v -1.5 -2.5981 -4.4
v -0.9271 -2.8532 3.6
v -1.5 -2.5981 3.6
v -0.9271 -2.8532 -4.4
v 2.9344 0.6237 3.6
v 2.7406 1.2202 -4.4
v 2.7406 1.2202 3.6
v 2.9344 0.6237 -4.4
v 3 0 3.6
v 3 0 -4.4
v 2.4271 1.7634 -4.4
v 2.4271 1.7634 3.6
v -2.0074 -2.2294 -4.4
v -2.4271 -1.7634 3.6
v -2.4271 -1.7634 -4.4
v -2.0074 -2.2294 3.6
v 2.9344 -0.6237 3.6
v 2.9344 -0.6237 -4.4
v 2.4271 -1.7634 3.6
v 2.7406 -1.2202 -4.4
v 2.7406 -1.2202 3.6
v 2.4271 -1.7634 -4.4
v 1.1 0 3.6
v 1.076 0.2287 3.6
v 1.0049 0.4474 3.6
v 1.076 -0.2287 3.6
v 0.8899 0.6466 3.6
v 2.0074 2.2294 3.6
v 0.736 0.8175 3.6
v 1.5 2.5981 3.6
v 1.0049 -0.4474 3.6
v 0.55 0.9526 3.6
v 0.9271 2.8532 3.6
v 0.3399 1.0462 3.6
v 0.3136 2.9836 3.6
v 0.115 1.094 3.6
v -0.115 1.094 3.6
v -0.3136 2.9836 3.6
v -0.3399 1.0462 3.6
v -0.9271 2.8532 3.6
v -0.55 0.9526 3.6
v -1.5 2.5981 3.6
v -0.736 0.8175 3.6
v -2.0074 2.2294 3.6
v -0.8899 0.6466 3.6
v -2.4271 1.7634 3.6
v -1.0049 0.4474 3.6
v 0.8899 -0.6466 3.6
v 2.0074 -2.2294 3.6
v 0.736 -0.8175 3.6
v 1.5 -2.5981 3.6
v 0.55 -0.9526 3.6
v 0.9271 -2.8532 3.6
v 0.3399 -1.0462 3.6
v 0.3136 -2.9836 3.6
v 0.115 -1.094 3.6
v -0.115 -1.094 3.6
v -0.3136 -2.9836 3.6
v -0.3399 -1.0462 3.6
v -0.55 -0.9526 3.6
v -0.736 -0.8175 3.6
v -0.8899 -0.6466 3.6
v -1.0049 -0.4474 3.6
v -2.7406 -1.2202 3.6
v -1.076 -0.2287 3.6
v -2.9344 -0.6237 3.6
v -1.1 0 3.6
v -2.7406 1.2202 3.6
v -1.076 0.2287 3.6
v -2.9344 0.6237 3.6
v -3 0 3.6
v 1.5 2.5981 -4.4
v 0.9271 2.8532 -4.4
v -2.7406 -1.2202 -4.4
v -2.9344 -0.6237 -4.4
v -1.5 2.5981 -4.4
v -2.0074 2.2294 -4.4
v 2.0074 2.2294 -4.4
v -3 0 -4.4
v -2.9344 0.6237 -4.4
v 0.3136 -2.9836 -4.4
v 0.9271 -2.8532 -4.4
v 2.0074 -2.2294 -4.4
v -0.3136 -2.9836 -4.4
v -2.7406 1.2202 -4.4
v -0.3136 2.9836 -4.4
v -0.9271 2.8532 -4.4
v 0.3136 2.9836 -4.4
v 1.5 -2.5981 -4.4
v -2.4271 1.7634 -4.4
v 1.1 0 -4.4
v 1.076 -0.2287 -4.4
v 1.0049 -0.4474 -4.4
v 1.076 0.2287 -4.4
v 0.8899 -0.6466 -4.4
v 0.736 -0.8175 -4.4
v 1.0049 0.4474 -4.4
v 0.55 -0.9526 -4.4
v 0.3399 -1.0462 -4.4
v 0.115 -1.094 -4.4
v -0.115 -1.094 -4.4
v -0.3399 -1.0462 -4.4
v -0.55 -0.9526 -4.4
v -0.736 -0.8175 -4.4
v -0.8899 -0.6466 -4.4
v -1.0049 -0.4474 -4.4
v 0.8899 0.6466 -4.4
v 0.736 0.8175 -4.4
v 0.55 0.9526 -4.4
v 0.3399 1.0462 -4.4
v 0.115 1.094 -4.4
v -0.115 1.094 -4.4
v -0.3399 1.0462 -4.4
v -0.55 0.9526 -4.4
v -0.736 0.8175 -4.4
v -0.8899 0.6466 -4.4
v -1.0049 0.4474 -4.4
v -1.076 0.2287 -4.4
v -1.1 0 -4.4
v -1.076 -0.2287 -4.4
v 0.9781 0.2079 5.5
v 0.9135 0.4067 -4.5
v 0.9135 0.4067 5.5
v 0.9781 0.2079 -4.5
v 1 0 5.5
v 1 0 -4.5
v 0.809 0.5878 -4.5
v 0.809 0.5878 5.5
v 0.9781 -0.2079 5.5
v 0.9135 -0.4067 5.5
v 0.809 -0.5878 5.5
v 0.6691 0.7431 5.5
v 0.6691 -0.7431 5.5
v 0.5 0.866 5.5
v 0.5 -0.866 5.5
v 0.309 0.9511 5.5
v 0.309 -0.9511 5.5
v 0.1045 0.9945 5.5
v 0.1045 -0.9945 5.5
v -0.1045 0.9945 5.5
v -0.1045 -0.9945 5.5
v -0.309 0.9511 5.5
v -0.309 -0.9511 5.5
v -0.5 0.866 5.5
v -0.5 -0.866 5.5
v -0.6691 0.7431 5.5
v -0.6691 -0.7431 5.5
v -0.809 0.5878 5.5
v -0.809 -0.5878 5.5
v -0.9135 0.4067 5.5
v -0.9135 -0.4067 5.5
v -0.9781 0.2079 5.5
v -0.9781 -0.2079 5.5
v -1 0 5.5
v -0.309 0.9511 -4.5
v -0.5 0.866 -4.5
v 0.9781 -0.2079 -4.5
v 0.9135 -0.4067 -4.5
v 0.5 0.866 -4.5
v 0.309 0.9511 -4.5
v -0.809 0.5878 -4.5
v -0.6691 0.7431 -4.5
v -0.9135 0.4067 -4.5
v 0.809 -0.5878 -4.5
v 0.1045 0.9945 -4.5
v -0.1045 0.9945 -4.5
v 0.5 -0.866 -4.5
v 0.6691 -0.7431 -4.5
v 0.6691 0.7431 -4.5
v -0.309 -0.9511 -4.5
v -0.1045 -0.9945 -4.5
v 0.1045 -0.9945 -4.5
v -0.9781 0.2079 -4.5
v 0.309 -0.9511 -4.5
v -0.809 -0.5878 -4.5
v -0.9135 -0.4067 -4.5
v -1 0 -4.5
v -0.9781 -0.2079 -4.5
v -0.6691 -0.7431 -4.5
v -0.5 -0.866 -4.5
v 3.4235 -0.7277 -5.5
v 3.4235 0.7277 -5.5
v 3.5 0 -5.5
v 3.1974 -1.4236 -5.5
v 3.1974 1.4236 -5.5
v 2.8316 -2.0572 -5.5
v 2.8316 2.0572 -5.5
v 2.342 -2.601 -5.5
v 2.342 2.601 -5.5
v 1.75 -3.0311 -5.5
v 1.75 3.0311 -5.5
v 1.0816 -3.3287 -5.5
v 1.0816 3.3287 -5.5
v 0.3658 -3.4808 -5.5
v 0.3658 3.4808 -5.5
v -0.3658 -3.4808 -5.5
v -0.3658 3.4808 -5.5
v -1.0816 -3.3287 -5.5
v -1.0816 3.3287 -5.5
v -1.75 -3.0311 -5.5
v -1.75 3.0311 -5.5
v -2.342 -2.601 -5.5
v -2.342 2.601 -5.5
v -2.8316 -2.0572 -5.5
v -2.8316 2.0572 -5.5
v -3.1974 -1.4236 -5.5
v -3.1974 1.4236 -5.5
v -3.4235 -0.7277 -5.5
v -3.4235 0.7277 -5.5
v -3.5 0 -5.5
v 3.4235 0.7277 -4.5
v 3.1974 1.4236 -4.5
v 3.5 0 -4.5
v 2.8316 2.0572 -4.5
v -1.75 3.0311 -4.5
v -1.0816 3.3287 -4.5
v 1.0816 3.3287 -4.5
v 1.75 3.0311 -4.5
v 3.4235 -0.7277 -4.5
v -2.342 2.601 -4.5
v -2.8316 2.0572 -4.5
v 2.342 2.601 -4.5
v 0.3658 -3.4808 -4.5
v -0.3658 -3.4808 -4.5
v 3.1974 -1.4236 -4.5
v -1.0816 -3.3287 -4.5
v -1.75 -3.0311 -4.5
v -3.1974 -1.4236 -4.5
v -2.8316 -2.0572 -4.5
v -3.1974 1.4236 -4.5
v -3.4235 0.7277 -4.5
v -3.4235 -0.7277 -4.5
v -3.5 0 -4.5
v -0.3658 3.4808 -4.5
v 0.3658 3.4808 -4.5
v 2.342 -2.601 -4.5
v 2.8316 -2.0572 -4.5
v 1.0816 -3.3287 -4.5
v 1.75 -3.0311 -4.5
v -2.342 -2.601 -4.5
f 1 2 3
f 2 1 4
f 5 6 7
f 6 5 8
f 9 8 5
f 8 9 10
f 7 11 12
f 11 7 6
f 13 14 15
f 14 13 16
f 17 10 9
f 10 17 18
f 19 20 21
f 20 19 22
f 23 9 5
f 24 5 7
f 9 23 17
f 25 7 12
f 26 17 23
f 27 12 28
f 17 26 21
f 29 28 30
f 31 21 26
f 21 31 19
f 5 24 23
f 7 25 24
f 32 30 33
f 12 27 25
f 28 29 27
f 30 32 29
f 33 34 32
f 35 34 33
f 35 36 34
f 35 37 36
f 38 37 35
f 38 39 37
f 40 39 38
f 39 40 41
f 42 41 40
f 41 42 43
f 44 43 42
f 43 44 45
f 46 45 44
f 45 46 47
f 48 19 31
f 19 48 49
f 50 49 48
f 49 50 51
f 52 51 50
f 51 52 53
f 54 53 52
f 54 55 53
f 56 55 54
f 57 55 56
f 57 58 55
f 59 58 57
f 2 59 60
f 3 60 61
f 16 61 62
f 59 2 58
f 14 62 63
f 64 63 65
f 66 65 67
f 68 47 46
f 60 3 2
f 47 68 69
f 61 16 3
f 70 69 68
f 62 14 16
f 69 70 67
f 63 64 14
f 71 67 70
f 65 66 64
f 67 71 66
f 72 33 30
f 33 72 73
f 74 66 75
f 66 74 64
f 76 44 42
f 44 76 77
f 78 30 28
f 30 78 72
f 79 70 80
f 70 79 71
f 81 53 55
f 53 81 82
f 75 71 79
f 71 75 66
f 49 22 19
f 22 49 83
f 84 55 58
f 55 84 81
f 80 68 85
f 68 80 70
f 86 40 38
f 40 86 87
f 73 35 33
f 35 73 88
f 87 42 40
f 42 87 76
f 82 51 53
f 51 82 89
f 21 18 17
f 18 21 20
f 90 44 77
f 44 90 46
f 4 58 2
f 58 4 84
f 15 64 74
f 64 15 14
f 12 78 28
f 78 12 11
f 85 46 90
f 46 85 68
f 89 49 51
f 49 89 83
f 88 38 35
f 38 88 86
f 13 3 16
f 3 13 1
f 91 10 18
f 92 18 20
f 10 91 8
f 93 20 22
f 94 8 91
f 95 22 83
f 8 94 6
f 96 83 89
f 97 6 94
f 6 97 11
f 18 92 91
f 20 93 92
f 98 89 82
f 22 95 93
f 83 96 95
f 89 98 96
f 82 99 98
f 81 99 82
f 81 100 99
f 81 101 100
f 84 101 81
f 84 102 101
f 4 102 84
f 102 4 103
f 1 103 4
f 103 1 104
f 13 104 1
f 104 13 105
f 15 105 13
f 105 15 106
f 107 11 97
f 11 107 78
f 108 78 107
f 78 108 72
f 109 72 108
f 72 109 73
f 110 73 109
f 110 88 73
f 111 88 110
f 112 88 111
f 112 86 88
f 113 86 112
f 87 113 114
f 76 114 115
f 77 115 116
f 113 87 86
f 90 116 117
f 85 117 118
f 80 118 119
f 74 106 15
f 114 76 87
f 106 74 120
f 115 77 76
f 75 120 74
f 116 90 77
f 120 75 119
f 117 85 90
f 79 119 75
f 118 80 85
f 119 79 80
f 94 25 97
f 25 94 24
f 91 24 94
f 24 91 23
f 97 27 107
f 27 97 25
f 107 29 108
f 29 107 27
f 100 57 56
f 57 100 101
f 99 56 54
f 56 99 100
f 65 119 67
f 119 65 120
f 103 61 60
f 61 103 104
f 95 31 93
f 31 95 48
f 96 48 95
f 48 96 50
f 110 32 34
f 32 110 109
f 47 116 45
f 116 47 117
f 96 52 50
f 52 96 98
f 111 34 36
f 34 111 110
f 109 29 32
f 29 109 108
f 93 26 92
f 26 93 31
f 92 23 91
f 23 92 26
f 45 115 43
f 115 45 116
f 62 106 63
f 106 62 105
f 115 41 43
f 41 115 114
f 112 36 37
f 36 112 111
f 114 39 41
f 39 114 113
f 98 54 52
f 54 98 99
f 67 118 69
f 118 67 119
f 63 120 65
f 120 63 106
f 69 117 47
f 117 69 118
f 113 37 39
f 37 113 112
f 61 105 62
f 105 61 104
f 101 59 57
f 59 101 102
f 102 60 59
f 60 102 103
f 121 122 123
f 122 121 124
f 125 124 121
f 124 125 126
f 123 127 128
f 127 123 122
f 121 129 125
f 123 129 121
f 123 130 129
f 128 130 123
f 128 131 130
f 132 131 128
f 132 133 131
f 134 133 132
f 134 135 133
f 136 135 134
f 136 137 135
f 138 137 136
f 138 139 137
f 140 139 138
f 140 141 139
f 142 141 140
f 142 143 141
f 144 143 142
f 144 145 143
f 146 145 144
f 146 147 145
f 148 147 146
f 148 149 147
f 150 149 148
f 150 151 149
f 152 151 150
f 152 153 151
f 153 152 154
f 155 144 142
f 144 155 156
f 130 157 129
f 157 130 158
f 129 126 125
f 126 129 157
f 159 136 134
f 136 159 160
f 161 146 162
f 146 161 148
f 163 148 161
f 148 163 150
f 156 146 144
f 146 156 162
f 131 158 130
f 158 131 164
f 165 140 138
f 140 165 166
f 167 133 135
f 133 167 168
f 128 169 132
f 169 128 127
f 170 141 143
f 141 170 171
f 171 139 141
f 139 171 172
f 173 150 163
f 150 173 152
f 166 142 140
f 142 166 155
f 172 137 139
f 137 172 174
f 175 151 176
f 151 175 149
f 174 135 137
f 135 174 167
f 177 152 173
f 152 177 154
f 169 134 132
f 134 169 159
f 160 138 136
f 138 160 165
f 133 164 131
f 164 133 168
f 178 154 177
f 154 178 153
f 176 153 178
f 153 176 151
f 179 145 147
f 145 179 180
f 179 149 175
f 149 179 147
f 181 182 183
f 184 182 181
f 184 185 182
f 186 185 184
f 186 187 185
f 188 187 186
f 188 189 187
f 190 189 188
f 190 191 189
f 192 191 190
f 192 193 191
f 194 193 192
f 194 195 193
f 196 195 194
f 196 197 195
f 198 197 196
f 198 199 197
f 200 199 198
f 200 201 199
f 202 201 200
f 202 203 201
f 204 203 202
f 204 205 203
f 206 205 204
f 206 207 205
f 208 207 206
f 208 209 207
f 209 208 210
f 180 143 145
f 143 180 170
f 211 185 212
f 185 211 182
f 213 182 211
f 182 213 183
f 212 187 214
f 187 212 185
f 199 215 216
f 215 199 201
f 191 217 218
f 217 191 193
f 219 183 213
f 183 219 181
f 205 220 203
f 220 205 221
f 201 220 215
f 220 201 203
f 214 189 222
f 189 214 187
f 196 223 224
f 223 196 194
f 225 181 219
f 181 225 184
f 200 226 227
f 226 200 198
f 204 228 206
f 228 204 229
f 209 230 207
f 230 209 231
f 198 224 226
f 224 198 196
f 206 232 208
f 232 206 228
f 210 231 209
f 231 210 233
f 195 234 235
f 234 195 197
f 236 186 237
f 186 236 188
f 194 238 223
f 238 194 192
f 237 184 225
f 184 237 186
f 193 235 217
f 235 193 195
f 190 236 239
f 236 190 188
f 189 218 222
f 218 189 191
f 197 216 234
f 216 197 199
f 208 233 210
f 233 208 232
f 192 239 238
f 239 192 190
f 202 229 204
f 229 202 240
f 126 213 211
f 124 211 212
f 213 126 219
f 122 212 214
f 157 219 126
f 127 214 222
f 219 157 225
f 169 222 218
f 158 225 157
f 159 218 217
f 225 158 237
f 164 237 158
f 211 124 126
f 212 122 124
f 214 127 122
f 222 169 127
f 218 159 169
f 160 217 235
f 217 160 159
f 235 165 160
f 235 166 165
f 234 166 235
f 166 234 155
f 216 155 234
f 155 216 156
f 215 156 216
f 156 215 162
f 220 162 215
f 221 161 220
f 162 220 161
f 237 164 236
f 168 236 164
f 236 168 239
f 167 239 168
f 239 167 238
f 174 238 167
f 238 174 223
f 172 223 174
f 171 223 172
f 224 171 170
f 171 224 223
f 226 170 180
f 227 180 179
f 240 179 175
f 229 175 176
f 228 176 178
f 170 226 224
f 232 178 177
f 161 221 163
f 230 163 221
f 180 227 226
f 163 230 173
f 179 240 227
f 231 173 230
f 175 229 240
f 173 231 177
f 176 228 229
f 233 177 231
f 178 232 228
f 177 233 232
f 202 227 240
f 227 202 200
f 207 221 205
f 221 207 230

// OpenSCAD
color("#A1662F")
cylinder(11,1,1, $fn = 30, center = true);

color("#A1662F")
translate([0,0,-5]){
cylinder(1,3.5,3.5, $fn = 30, center = true);
}



translate([0,0,-0.4]){
difference(){
color("#edefe2")
cylinder(8,3,3, $fn = 30, center = true);

color("gray")
cylinder(8.1,1.1,1.1, $fn = 30, center = true);
}
}
